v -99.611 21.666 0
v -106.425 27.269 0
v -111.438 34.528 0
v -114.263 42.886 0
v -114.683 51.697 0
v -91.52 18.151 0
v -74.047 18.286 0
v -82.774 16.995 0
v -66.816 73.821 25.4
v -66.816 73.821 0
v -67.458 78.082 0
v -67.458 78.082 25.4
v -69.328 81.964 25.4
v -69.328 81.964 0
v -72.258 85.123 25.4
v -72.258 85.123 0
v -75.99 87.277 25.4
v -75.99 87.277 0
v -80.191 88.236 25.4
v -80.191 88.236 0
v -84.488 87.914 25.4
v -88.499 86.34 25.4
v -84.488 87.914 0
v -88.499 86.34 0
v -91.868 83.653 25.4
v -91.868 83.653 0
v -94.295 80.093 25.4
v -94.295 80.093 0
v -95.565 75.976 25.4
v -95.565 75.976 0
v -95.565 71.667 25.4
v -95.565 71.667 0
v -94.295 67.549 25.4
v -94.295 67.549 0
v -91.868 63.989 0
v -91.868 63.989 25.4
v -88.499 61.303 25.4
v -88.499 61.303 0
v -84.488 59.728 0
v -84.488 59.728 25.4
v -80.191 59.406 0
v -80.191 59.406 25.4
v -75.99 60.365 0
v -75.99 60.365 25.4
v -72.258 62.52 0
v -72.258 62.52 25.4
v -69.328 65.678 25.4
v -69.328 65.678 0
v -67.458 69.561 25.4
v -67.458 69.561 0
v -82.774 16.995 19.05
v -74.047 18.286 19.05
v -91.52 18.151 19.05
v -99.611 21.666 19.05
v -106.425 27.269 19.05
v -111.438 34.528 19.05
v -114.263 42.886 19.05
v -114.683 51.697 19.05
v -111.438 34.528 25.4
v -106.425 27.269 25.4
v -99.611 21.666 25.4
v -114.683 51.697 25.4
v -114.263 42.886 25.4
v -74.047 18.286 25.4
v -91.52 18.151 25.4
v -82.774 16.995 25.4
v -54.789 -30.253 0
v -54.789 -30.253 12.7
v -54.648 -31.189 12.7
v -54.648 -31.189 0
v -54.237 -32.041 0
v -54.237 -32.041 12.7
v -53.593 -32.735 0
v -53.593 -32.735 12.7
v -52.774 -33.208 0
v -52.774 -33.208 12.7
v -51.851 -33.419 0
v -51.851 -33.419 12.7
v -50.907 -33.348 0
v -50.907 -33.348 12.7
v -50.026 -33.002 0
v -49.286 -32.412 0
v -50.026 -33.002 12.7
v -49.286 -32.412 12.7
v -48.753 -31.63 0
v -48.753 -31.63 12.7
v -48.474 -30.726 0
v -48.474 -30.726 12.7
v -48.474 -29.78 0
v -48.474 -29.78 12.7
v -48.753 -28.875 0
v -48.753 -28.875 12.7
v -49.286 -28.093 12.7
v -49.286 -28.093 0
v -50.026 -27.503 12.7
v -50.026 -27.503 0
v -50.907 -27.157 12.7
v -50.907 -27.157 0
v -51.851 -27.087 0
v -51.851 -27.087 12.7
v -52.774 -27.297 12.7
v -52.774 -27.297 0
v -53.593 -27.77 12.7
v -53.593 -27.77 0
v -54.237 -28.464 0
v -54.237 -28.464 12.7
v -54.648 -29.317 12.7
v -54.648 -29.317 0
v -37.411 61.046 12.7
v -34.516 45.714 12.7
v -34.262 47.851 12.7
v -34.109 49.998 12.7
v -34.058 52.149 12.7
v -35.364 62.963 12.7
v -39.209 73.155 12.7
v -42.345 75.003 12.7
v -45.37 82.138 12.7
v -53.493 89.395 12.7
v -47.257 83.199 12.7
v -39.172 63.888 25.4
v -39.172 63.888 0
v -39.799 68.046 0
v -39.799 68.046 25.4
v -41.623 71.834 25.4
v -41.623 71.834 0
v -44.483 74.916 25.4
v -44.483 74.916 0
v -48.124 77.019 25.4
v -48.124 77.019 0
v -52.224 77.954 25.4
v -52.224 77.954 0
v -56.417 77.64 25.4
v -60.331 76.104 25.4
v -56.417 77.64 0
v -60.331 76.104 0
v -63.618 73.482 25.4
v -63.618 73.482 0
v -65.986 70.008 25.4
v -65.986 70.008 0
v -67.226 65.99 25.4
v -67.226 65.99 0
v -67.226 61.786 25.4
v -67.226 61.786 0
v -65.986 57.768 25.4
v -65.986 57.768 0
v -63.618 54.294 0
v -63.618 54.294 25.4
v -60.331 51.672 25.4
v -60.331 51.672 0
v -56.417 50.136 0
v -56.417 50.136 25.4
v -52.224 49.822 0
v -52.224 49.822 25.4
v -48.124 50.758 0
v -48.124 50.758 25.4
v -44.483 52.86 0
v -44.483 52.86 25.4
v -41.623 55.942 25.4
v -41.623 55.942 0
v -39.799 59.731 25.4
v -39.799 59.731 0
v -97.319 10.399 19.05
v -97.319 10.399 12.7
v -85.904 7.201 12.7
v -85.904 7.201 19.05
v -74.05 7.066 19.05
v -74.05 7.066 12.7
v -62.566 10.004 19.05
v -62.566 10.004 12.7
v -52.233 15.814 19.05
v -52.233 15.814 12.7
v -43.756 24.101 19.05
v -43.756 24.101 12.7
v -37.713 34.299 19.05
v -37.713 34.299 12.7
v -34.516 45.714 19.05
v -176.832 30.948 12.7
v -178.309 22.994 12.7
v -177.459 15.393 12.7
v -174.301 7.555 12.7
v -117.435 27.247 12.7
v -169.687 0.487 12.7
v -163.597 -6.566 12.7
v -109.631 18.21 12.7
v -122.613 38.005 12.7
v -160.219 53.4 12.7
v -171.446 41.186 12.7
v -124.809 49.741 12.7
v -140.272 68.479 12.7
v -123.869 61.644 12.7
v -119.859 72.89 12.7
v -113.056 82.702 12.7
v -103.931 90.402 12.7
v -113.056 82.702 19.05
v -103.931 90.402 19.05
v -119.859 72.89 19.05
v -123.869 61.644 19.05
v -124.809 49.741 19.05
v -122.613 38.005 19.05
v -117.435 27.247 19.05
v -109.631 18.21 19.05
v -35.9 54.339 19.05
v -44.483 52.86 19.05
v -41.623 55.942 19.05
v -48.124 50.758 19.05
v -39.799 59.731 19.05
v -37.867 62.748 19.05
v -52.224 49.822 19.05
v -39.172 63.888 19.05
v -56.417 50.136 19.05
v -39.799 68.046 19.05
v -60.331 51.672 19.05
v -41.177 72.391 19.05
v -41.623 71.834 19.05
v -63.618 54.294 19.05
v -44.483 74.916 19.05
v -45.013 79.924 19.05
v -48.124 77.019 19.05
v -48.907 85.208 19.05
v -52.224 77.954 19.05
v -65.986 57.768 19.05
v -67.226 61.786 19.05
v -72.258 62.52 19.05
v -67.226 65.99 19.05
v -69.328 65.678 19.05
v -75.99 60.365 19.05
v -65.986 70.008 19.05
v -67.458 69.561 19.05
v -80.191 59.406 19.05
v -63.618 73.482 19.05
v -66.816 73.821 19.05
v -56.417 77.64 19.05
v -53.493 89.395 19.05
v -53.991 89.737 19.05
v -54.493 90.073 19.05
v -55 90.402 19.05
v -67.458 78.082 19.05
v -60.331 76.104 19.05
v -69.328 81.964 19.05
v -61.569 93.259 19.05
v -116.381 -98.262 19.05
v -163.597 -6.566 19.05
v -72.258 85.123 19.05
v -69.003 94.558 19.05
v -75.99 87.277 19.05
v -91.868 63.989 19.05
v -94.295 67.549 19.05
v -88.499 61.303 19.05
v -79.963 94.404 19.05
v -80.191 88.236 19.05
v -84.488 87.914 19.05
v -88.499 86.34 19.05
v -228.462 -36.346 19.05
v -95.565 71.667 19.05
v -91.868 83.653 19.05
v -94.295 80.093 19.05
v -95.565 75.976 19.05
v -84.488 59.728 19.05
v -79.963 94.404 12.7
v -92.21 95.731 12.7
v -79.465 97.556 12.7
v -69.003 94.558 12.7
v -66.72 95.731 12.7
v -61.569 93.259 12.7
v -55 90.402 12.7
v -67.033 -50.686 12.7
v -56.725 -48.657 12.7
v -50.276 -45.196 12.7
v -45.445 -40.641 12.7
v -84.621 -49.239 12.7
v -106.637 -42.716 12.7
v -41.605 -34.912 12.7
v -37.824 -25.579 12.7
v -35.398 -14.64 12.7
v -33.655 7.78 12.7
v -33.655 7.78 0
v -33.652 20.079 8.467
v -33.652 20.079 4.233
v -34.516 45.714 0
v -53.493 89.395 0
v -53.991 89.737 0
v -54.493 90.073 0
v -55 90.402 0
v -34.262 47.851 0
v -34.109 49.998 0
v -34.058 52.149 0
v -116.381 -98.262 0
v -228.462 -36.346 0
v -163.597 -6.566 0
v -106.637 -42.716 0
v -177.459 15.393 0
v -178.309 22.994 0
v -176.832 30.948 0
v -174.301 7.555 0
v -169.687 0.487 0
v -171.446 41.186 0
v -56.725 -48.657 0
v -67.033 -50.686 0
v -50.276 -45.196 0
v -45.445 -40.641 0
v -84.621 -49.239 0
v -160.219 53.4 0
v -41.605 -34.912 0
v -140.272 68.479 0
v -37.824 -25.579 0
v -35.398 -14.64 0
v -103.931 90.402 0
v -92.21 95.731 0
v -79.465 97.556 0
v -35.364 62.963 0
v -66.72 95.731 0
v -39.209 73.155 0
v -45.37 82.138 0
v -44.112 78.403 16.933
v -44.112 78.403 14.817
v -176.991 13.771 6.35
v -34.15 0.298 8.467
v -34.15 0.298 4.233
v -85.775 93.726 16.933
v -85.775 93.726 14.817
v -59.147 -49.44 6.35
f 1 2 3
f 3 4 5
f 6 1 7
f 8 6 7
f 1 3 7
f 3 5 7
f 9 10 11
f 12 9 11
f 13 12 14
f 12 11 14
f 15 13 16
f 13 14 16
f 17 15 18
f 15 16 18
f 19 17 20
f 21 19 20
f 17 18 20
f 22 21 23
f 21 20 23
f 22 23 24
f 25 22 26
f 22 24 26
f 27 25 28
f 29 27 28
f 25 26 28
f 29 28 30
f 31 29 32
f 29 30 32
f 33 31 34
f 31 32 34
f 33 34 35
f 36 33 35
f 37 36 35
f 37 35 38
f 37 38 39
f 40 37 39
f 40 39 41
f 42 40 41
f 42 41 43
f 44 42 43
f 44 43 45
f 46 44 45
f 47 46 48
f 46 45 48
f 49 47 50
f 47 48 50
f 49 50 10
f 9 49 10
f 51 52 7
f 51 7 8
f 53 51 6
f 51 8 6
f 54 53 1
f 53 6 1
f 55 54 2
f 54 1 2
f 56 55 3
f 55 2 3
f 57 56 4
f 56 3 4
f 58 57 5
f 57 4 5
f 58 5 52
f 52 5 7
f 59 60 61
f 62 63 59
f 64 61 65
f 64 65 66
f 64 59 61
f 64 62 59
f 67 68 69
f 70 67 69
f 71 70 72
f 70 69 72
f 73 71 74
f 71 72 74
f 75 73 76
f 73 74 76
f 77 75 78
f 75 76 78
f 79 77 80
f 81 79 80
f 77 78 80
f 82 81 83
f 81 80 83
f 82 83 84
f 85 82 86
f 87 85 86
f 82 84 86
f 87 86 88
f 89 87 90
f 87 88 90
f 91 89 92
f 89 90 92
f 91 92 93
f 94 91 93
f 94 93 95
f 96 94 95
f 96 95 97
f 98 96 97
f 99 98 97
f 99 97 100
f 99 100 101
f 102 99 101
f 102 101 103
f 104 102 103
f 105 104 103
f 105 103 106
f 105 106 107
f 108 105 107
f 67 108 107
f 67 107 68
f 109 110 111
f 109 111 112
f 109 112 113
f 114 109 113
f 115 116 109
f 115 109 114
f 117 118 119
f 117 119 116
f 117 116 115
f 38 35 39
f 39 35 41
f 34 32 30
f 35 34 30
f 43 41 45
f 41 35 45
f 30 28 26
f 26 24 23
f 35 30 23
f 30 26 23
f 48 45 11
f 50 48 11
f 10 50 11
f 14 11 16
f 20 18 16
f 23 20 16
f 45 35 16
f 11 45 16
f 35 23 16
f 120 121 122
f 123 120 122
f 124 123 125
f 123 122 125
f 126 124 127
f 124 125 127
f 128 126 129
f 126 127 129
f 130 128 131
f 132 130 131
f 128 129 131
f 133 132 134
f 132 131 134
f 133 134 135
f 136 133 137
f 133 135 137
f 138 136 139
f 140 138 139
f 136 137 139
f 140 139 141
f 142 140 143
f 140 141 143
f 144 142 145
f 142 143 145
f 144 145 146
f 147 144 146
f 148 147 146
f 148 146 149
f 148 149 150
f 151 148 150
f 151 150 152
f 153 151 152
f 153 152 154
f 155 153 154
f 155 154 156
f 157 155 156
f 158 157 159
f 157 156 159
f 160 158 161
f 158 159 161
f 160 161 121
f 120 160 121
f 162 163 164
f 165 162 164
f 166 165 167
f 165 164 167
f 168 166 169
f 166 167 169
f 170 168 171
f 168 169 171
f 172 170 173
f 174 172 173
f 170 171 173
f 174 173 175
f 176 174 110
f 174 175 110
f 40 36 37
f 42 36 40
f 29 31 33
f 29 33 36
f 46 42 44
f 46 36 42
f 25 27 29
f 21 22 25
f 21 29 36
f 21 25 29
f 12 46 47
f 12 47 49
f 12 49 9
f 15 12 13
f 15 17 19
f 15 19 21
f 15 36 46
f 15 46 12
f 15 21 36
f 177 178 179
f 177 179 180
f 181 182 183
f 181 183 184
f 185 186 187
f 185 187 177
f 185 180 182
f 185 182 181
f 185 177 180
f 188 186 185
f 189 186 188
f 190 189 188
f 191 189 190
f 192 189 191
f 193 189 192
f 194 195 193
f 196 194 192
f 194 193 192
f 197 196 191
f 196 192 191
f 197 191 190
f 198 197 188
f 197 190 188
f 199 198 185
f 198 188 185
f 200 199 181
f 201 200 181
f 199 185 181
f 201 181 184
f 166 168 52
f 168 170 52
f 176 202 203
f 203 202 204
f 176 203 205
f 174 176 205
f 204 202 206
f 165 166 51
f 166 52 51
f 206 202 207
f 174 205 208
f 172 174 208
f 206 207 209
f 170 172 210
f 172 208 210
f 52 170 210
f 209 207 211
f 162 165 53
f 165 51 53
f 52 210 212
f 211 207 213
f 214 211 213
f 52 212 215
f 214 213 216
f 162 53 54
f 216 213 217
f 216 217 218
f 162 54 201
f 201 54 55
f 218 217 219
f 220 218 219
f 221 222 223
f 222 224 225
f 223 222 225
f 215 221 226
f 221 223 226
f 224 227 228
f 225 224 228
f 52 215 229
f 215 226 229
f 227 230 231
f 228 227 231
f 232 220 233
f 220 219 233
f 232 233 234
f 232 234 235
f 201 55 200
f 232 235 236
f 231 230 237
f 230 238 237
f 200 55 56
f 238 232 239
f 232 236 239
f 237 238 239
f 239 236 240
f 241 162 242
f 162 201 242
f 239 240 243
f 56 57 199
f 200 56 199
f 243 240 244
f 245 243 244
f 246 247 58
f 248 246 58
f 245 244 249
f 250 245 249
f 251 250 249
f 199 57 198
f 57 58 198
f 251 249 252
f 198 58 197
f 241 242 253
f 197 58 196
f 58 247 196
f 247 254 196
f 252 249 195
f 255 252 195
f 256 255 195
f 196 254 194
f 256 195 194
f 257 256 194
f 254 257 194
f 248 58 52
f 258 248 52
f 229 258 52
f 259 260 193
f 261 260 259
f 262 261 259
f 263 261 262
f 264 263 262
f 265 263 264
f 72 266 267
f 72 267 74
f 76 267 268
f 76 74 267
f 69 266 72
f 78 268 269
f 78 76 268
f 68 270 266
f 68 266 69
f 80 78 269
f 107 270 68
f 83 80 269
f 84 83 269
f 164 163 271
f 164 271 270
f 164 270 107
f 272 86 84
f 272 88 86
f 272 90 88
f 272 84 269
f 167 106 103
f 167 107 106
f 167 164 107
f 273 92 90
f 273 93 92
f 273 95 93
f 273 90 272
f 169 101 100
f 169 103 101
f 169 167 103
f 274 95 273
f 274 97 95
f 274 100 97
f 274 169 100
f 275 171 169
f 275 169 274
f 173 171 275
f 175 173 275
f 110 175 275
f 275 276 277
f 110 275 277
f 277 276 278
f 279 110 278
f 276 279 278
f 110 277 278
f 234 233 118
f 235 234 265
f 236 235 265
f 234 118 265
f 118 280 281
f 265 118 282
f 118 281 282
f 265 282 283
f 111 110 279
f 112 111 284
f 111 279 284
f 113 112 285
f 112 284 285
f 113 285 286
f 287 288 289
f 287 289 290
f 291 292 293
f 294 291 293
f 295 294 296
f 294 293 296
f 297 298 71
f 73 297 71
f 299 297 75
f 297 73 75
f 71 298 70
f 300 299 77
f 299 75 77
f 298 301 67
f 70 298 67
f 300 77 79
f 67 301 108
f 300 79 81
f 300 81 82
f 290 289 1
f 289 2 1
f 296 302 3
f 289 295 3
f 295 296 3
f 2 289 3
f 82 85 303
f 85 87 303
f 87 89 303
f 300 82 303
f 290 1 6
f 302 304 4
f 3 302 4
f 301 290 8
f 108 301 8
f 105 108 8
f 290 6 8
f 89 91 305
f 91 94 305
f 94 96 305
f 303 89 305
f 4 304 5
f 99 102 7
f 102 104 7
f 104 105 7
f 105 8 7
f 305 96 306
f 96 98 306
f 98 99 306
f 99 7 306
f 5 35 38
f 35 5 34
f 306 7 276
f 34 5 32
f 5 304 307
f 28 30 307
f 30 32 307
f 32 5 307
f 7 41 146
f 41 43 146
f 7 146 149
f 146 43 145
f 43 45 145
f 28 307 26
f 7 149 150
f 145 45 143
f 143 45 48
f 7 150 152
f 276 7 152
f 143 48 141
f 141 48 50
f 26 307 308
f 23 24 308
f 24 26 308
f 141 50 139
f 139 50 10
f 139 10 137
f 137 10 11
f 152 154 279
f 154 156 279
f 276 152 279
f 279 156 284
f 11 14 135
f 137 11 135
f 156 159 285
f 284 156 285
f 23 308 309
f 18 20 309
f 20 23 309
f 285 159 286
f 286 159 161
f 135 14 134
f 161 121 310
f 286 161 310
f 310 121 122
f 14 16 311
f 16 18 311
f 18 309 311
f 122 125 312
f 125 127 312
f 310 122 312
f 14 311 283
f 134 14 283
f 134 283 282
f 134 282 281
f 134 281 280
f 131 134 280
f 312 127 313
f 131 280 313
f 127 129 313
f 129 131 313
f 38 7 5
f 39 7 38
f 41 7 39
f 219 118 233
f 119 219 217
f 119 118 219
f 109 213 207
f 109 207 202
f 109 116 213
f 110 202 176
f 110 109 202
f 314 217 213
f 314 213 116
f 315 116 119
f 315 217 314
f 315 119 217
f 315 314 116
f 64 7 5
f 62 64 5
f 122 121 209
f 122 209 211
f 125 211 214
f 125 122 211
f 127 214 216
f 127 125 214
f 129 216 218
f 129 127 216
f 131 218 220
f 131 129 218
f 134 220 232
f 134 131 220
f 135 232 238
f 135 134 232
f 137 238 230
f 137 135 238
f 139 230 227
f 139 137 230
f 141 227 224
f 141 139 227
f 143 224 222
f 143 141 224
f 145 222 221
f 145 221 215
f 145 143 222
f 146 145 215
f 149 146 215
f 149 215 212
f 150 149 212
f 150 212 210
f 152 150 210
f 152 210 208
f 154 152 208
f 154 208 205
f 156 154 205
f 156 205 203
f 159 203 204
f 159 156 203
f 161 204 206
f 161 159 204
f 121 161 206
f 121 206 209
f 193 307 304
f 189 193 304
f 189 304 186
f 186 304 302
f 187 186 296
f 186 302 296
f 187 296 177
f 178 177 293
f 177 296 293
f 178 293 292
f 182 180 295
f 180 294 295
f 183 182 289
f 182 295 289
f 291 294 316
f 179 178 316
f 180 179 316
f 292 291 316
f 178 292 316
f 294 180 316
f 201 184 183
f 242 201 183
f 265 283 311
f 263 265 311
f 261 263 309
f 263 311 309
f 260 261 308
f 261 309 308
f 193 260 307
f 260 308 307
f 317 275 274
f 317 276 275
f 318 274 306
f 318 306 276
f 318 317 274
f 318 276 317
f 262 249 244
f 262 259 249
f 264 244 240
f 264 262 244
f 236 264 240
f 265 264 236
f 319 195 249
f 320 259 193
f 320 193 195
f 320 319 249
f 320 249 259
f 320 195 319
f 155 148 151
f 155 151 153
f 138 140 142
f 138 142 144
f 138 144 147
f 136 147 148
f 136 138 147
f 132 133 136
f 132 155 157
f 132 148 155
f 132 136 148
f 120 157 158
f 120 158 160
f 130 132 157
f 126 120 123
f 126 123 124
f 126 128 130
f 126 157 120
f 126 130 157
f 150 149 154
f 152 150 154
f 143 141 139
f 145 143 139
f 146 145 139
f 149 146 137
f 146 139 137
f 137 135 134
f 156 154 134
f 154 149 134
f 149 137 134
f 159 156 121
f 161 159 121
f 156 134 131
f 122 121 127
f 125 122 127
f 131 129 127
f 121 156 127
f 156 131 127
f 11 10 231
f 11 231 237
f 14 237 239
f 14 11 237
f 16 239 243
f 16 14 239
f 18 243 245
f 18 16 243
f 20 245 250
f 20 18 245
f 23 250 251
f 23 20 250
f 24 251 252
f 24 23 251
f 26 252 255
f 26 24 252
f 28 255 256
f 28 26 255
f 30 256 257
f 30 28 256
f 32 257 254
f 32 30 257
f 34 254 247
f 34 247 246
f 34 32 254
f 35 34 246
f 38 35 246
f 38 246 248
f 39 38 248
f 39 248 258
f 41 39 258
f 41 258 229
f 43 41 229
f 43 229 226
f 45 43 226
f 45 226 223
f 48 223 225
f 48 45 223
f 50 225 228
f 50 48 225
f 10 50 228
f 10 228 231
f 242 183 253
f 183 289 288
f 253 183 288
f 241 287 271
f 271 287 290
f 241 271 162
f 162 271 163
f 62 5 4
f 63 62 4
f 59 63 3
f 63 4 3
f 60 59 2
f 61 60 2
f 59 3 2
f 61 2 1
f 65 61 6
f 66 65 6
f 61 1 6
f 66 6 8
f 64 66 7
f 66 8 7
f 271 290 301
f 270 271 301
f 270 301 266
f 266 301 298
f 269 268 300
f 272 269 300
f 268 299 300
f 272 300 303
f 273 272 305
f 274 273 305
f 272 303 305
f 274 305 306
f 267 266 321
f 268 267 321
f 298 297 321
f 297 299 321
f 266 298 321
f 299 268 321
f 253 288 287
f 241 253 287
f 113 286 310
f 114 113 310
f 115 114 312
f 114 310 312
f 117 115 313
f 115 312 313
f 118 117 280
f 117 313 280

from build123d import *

# Parameters (mm, degrees)
F0_R     = 14.4552561753
F1_DEPTH = 25.4
F0_R_2   = 14.1055177091
F2_DEPTH = 25.4
F3_DEPTH = 19.05
F4_DEPTH = 12.7
F5_D     = 6.35


with BuildPart() as f1:
    # F0 (on Top) → F1 (new body)
    with BuildSketch(Plane.XY):
        with Locations((-81.2711715698, 73.8213211298)):
            Circle(F0_R)
    extrude(amount=F1_DEPTH)


with BuildPart() as f1b:
    # F0 (on Top) → F1, piece 2 (new body)
    with BuildSketch(Plane.XY):
        with Locations((-53.2777681947, 63.8881772757)):
            Circle(F0_R_2)
    extrude(amount=F1_DEPTH)


with BuildPart() as f2:
    # F0 (on Top) → F2 (new body)
    with BuildSketch(Plane.XY):
        with BuildLine():
            Line((-74.0470662713, 18.2860158384), (-114.6826595068, 51.6974963248))
            ThreePointArc((-114.6826595068, 51.6974963248), (-103.2133178037, 24.2301193795), (-74.0470662713, 18.2860158384))
        make_face()
    extrude(amount=F2_DEPTH)


with BuildPart() as f3:
    # F0 (on Top) → F3 (new body)
    with BuildSketch(Plane.XY):
        with BuildLine():
            add(Edge.make_bspline(
                [(-103.9305479169, 90.4016562837), (-85.5451875426, 94.1420875768), (-67.1577257905, 97.8824388379), (-54.9997537494, 90.4016562837)],
                knots=[0, 0, 0, 0, 0.3212337954, 0.3212337954, 0.3212337954, 0.3212337954], degree=3))
            ThreePointArc((-103.9305479169, 90.4016562837), (-124.7315260032, 55.7234288399), (-109.6310896018, 18.2102715683))
            ThreePointArc((-109.6310896018, 18.2102715683), (-103.7905878899, 13.807191904), (-97.3189082255, 10.3989763741))
            ThreePointArc((-97.3189082255, 10.3989763741), (-57.2090185765, 12.5701456796), (-34.5160862415, 45.7144973229))
            add(Edge.make_bspline(
                [(-53.4932820949, 89.3952534818), (-42.3206165187, 81.3231253274), (-36.7860243282, 63.3564941894), (-34.5160862415, 45.7144973229)],
                knots=[0.3347931008, 0.3347931008, 0.3347931008, 0.3347931008, 0.6432129986, 0.6432129986, 0.6432129986, 0.6432129986], degree=3))
            ThreePointArc((-53.4932820949, 89.3952534818), (-54.2414980931, 89.9059690015), (-54.9997537494, 90.4016562837))
        make_face()
        with BuildLine():
            ThreePointArc((-74.0470662713, 18.2860158384), (-103.2133178037, 24.2301193795), (-114.6826595068, 51.6974963248))
            Line((-114.6826595068, 51.6974963248), (-74.0470662713, 18.2860158384))
        make_face(mode=Mode.SUBTRACT)
        with Locations((-53.2777681947, 63.8881772757)):
            Circle(F0_R_2, mode=Mode.SUBTRACT)
        with Locations((-81.2711715698, 73.8213211298)):
            Circle(F0_R, mode=Mode.SUBTRACT)
        with BuildLine():
            add(Edge.make_bspline(
                [(-163.5967197374, -6.5658674452), (-149.7277033092, -20.9495587277), (-127.9072747806, -34.4993701413), (-106.6365792263, -42.7157834978)],
                knots=[0.3978120133, 0.3978120133, 0.3978120133, 0.3978120133, 0.5553003686, 0.5553003686, 0.5553003686, 0.5553003686], degree=3))
            Line((-163.5967197374, -6.5658674452), (-228.4622937441, -36.3462753594))
            Line((-228.4622937441, -36.3462753594), (-116.3808330894, -98.2622504234))
            Line((-116.3808330894, -98.2622504234), (-106.6365792263, -42.7157834978))
        make_face()
        with BuildLine():
            ThreePointArc((-97.3189082255, 10.3989763741), (-103.7905878899, 13.807191904), (-109.6310896018, 18.2102715683))
            Line((-109.6310896018, 18.2102715683), (-163.5967197374, -6.5658674452))
            add(Edge.make_bspline(
                [(-163.5967197374, -6.5658674452), (-149.7277033092, -20.9495587277), (-127.9072747806, -34.4993701413), (-106.6365792263, -42.7157834978)],
                knots=[0.3978120133, 0.3978120133, 0.3978120133, 0.3978120133, 0.5553003686, 0.5553003686, 0.5553003686, 0.5553003686], degree=3))
            Line((-106.6365792263, -42.7157834978), (-97.3189082255, 10.3989763741))
        make_face()
    extrude(amount=F3_DEPTH)

    # F0 (on Top) → F4 (join)
    with BuildSketch(Plane.XY):
        with BuildLine():
            ThreePointArc((-109.6310896018, 18.2102715683), (-124.7315260032, 55.7234288399), (-103.9305479169, 90.4016562837))
            add(Edge.make_bspline(
                [(-103.9305479169, 90.4016562837), (-145.1287182509, 66.6744327068), (-195.7123211671, 37.5058393875), (-170.1054887435, 0.1844399394), (-163.5967197374, -6.5658674452)],
                knots=[0, 0, 0, 0, 0.3239022785, 0.3978120133, 0.3978120133, 0.3978120133, 0.3978120133], degree=3))
            Line((-163.5967197374, -6.5658674452), (-109.6310896018, 18.2102715683))
        make_face()
        with BuildLine():
            ThreePointArc((-34.5160862415, 45.7144973229), (-57.2090185765, 12.5701456796), (-97.3189082255, 10.3989763741))
            Line((-97.3189082255, 10.3989763741), (-106.6365792263, -42.7157834978))
            add(Edge.make_bspline(
                [(-106.6365792263, -42.7157834978), (-88.7249650646, -49.6346557771), (-50.3292323273, -56.5087407704), (-38.1803516801, -32.3214083153), (-35.3982208139, -14.640254907)],
                knots=[0.5553003686, 0.5553003686, 0.5553003686, 0.5553003686, 0.6879180654, 0.8459071389, 0.8459071389, 0.8459071389, 0.8459071389], degree=3))
            add(Edge.make_bspline(
                [(-33.6551310256, 7.780247472), (-34.0817074351, 0.2913735883), (-34.7384191947, -7.1746038566), (-35.3982208139, -14.640254907)],
                knots=[0.8666301254, 0.8666301254, 0.8666301254, 0.8666301254, 1, 1, 1, 1], degree=3))
            add(Edge.make_bspline(
                [(-33.6551310256, 7.780247472), (-33.418672051, 19.8012809669), (-33.9699834553, 32.758318881), (-34.5160862415, 45.7144973229)],
                knots=[0.9073726977, 0.9073726977, 0.9073726977, 0.9073726977, 1, 1, 1, 1], degree=3))
        make_face()
        with BuildLine():
            ThreePointArc((-54.9997537494, 90.4016562837), (-79.4651508331, 97.5562834336), (-103.9305479169, 90.4016562837))
            add(Edge.make_bspline(
                [(-103.9305479169, 90.4016562837), (-85.5451875426, 94.1420875768), (-67.1577257905, 97.8824388379), (-54.9997537494, 90.4016562837)],
                knots=[0, 0, 0, 0, 0.3212337954, 0.3212337954, 0.3212337954, 0.3212337954], degree=3))
        make_face()
        with BuildLine():
            ThreePointArc((-34.0578689085, 52.149001509), (-39.2088890985, 73.1550635611), (-53.4932820949, 89.3952534818))
            add(Edge.make_bspline(
                [(-53.4932820949, 89.3952534818), (-42.3206165187, 81.3231253274), (-36.7860243282, 63.3564941894), (-34.5160862415, 45.7144973229)],
                knots=[0.3347931008, 0.3347931008, 0.3347931008, 0.3347931008, 0.6432129986, 0.6432129986, 0.6432129986, 0.6432129986], degree=3))
            ThreePointArc((-34.5160862415, 45.7144973229), (-34.1725681074, 48.9236020281), (-34.0578689085, 52.149001509))
        make_face()
    extrude(amount=F4_DEPTH)

    # F5 (through all)
    with Locations(Plane(origin=(0, 0, 0), x_dir=(1, 0, 0), z_dir=(0, 0, -1))):
        with Locations((-51.6138523817, 30.2527993917)):
            Hole(F5_D / 2)


solid = Compound([f1.part, f1b.part, f2.part, f3.part])
